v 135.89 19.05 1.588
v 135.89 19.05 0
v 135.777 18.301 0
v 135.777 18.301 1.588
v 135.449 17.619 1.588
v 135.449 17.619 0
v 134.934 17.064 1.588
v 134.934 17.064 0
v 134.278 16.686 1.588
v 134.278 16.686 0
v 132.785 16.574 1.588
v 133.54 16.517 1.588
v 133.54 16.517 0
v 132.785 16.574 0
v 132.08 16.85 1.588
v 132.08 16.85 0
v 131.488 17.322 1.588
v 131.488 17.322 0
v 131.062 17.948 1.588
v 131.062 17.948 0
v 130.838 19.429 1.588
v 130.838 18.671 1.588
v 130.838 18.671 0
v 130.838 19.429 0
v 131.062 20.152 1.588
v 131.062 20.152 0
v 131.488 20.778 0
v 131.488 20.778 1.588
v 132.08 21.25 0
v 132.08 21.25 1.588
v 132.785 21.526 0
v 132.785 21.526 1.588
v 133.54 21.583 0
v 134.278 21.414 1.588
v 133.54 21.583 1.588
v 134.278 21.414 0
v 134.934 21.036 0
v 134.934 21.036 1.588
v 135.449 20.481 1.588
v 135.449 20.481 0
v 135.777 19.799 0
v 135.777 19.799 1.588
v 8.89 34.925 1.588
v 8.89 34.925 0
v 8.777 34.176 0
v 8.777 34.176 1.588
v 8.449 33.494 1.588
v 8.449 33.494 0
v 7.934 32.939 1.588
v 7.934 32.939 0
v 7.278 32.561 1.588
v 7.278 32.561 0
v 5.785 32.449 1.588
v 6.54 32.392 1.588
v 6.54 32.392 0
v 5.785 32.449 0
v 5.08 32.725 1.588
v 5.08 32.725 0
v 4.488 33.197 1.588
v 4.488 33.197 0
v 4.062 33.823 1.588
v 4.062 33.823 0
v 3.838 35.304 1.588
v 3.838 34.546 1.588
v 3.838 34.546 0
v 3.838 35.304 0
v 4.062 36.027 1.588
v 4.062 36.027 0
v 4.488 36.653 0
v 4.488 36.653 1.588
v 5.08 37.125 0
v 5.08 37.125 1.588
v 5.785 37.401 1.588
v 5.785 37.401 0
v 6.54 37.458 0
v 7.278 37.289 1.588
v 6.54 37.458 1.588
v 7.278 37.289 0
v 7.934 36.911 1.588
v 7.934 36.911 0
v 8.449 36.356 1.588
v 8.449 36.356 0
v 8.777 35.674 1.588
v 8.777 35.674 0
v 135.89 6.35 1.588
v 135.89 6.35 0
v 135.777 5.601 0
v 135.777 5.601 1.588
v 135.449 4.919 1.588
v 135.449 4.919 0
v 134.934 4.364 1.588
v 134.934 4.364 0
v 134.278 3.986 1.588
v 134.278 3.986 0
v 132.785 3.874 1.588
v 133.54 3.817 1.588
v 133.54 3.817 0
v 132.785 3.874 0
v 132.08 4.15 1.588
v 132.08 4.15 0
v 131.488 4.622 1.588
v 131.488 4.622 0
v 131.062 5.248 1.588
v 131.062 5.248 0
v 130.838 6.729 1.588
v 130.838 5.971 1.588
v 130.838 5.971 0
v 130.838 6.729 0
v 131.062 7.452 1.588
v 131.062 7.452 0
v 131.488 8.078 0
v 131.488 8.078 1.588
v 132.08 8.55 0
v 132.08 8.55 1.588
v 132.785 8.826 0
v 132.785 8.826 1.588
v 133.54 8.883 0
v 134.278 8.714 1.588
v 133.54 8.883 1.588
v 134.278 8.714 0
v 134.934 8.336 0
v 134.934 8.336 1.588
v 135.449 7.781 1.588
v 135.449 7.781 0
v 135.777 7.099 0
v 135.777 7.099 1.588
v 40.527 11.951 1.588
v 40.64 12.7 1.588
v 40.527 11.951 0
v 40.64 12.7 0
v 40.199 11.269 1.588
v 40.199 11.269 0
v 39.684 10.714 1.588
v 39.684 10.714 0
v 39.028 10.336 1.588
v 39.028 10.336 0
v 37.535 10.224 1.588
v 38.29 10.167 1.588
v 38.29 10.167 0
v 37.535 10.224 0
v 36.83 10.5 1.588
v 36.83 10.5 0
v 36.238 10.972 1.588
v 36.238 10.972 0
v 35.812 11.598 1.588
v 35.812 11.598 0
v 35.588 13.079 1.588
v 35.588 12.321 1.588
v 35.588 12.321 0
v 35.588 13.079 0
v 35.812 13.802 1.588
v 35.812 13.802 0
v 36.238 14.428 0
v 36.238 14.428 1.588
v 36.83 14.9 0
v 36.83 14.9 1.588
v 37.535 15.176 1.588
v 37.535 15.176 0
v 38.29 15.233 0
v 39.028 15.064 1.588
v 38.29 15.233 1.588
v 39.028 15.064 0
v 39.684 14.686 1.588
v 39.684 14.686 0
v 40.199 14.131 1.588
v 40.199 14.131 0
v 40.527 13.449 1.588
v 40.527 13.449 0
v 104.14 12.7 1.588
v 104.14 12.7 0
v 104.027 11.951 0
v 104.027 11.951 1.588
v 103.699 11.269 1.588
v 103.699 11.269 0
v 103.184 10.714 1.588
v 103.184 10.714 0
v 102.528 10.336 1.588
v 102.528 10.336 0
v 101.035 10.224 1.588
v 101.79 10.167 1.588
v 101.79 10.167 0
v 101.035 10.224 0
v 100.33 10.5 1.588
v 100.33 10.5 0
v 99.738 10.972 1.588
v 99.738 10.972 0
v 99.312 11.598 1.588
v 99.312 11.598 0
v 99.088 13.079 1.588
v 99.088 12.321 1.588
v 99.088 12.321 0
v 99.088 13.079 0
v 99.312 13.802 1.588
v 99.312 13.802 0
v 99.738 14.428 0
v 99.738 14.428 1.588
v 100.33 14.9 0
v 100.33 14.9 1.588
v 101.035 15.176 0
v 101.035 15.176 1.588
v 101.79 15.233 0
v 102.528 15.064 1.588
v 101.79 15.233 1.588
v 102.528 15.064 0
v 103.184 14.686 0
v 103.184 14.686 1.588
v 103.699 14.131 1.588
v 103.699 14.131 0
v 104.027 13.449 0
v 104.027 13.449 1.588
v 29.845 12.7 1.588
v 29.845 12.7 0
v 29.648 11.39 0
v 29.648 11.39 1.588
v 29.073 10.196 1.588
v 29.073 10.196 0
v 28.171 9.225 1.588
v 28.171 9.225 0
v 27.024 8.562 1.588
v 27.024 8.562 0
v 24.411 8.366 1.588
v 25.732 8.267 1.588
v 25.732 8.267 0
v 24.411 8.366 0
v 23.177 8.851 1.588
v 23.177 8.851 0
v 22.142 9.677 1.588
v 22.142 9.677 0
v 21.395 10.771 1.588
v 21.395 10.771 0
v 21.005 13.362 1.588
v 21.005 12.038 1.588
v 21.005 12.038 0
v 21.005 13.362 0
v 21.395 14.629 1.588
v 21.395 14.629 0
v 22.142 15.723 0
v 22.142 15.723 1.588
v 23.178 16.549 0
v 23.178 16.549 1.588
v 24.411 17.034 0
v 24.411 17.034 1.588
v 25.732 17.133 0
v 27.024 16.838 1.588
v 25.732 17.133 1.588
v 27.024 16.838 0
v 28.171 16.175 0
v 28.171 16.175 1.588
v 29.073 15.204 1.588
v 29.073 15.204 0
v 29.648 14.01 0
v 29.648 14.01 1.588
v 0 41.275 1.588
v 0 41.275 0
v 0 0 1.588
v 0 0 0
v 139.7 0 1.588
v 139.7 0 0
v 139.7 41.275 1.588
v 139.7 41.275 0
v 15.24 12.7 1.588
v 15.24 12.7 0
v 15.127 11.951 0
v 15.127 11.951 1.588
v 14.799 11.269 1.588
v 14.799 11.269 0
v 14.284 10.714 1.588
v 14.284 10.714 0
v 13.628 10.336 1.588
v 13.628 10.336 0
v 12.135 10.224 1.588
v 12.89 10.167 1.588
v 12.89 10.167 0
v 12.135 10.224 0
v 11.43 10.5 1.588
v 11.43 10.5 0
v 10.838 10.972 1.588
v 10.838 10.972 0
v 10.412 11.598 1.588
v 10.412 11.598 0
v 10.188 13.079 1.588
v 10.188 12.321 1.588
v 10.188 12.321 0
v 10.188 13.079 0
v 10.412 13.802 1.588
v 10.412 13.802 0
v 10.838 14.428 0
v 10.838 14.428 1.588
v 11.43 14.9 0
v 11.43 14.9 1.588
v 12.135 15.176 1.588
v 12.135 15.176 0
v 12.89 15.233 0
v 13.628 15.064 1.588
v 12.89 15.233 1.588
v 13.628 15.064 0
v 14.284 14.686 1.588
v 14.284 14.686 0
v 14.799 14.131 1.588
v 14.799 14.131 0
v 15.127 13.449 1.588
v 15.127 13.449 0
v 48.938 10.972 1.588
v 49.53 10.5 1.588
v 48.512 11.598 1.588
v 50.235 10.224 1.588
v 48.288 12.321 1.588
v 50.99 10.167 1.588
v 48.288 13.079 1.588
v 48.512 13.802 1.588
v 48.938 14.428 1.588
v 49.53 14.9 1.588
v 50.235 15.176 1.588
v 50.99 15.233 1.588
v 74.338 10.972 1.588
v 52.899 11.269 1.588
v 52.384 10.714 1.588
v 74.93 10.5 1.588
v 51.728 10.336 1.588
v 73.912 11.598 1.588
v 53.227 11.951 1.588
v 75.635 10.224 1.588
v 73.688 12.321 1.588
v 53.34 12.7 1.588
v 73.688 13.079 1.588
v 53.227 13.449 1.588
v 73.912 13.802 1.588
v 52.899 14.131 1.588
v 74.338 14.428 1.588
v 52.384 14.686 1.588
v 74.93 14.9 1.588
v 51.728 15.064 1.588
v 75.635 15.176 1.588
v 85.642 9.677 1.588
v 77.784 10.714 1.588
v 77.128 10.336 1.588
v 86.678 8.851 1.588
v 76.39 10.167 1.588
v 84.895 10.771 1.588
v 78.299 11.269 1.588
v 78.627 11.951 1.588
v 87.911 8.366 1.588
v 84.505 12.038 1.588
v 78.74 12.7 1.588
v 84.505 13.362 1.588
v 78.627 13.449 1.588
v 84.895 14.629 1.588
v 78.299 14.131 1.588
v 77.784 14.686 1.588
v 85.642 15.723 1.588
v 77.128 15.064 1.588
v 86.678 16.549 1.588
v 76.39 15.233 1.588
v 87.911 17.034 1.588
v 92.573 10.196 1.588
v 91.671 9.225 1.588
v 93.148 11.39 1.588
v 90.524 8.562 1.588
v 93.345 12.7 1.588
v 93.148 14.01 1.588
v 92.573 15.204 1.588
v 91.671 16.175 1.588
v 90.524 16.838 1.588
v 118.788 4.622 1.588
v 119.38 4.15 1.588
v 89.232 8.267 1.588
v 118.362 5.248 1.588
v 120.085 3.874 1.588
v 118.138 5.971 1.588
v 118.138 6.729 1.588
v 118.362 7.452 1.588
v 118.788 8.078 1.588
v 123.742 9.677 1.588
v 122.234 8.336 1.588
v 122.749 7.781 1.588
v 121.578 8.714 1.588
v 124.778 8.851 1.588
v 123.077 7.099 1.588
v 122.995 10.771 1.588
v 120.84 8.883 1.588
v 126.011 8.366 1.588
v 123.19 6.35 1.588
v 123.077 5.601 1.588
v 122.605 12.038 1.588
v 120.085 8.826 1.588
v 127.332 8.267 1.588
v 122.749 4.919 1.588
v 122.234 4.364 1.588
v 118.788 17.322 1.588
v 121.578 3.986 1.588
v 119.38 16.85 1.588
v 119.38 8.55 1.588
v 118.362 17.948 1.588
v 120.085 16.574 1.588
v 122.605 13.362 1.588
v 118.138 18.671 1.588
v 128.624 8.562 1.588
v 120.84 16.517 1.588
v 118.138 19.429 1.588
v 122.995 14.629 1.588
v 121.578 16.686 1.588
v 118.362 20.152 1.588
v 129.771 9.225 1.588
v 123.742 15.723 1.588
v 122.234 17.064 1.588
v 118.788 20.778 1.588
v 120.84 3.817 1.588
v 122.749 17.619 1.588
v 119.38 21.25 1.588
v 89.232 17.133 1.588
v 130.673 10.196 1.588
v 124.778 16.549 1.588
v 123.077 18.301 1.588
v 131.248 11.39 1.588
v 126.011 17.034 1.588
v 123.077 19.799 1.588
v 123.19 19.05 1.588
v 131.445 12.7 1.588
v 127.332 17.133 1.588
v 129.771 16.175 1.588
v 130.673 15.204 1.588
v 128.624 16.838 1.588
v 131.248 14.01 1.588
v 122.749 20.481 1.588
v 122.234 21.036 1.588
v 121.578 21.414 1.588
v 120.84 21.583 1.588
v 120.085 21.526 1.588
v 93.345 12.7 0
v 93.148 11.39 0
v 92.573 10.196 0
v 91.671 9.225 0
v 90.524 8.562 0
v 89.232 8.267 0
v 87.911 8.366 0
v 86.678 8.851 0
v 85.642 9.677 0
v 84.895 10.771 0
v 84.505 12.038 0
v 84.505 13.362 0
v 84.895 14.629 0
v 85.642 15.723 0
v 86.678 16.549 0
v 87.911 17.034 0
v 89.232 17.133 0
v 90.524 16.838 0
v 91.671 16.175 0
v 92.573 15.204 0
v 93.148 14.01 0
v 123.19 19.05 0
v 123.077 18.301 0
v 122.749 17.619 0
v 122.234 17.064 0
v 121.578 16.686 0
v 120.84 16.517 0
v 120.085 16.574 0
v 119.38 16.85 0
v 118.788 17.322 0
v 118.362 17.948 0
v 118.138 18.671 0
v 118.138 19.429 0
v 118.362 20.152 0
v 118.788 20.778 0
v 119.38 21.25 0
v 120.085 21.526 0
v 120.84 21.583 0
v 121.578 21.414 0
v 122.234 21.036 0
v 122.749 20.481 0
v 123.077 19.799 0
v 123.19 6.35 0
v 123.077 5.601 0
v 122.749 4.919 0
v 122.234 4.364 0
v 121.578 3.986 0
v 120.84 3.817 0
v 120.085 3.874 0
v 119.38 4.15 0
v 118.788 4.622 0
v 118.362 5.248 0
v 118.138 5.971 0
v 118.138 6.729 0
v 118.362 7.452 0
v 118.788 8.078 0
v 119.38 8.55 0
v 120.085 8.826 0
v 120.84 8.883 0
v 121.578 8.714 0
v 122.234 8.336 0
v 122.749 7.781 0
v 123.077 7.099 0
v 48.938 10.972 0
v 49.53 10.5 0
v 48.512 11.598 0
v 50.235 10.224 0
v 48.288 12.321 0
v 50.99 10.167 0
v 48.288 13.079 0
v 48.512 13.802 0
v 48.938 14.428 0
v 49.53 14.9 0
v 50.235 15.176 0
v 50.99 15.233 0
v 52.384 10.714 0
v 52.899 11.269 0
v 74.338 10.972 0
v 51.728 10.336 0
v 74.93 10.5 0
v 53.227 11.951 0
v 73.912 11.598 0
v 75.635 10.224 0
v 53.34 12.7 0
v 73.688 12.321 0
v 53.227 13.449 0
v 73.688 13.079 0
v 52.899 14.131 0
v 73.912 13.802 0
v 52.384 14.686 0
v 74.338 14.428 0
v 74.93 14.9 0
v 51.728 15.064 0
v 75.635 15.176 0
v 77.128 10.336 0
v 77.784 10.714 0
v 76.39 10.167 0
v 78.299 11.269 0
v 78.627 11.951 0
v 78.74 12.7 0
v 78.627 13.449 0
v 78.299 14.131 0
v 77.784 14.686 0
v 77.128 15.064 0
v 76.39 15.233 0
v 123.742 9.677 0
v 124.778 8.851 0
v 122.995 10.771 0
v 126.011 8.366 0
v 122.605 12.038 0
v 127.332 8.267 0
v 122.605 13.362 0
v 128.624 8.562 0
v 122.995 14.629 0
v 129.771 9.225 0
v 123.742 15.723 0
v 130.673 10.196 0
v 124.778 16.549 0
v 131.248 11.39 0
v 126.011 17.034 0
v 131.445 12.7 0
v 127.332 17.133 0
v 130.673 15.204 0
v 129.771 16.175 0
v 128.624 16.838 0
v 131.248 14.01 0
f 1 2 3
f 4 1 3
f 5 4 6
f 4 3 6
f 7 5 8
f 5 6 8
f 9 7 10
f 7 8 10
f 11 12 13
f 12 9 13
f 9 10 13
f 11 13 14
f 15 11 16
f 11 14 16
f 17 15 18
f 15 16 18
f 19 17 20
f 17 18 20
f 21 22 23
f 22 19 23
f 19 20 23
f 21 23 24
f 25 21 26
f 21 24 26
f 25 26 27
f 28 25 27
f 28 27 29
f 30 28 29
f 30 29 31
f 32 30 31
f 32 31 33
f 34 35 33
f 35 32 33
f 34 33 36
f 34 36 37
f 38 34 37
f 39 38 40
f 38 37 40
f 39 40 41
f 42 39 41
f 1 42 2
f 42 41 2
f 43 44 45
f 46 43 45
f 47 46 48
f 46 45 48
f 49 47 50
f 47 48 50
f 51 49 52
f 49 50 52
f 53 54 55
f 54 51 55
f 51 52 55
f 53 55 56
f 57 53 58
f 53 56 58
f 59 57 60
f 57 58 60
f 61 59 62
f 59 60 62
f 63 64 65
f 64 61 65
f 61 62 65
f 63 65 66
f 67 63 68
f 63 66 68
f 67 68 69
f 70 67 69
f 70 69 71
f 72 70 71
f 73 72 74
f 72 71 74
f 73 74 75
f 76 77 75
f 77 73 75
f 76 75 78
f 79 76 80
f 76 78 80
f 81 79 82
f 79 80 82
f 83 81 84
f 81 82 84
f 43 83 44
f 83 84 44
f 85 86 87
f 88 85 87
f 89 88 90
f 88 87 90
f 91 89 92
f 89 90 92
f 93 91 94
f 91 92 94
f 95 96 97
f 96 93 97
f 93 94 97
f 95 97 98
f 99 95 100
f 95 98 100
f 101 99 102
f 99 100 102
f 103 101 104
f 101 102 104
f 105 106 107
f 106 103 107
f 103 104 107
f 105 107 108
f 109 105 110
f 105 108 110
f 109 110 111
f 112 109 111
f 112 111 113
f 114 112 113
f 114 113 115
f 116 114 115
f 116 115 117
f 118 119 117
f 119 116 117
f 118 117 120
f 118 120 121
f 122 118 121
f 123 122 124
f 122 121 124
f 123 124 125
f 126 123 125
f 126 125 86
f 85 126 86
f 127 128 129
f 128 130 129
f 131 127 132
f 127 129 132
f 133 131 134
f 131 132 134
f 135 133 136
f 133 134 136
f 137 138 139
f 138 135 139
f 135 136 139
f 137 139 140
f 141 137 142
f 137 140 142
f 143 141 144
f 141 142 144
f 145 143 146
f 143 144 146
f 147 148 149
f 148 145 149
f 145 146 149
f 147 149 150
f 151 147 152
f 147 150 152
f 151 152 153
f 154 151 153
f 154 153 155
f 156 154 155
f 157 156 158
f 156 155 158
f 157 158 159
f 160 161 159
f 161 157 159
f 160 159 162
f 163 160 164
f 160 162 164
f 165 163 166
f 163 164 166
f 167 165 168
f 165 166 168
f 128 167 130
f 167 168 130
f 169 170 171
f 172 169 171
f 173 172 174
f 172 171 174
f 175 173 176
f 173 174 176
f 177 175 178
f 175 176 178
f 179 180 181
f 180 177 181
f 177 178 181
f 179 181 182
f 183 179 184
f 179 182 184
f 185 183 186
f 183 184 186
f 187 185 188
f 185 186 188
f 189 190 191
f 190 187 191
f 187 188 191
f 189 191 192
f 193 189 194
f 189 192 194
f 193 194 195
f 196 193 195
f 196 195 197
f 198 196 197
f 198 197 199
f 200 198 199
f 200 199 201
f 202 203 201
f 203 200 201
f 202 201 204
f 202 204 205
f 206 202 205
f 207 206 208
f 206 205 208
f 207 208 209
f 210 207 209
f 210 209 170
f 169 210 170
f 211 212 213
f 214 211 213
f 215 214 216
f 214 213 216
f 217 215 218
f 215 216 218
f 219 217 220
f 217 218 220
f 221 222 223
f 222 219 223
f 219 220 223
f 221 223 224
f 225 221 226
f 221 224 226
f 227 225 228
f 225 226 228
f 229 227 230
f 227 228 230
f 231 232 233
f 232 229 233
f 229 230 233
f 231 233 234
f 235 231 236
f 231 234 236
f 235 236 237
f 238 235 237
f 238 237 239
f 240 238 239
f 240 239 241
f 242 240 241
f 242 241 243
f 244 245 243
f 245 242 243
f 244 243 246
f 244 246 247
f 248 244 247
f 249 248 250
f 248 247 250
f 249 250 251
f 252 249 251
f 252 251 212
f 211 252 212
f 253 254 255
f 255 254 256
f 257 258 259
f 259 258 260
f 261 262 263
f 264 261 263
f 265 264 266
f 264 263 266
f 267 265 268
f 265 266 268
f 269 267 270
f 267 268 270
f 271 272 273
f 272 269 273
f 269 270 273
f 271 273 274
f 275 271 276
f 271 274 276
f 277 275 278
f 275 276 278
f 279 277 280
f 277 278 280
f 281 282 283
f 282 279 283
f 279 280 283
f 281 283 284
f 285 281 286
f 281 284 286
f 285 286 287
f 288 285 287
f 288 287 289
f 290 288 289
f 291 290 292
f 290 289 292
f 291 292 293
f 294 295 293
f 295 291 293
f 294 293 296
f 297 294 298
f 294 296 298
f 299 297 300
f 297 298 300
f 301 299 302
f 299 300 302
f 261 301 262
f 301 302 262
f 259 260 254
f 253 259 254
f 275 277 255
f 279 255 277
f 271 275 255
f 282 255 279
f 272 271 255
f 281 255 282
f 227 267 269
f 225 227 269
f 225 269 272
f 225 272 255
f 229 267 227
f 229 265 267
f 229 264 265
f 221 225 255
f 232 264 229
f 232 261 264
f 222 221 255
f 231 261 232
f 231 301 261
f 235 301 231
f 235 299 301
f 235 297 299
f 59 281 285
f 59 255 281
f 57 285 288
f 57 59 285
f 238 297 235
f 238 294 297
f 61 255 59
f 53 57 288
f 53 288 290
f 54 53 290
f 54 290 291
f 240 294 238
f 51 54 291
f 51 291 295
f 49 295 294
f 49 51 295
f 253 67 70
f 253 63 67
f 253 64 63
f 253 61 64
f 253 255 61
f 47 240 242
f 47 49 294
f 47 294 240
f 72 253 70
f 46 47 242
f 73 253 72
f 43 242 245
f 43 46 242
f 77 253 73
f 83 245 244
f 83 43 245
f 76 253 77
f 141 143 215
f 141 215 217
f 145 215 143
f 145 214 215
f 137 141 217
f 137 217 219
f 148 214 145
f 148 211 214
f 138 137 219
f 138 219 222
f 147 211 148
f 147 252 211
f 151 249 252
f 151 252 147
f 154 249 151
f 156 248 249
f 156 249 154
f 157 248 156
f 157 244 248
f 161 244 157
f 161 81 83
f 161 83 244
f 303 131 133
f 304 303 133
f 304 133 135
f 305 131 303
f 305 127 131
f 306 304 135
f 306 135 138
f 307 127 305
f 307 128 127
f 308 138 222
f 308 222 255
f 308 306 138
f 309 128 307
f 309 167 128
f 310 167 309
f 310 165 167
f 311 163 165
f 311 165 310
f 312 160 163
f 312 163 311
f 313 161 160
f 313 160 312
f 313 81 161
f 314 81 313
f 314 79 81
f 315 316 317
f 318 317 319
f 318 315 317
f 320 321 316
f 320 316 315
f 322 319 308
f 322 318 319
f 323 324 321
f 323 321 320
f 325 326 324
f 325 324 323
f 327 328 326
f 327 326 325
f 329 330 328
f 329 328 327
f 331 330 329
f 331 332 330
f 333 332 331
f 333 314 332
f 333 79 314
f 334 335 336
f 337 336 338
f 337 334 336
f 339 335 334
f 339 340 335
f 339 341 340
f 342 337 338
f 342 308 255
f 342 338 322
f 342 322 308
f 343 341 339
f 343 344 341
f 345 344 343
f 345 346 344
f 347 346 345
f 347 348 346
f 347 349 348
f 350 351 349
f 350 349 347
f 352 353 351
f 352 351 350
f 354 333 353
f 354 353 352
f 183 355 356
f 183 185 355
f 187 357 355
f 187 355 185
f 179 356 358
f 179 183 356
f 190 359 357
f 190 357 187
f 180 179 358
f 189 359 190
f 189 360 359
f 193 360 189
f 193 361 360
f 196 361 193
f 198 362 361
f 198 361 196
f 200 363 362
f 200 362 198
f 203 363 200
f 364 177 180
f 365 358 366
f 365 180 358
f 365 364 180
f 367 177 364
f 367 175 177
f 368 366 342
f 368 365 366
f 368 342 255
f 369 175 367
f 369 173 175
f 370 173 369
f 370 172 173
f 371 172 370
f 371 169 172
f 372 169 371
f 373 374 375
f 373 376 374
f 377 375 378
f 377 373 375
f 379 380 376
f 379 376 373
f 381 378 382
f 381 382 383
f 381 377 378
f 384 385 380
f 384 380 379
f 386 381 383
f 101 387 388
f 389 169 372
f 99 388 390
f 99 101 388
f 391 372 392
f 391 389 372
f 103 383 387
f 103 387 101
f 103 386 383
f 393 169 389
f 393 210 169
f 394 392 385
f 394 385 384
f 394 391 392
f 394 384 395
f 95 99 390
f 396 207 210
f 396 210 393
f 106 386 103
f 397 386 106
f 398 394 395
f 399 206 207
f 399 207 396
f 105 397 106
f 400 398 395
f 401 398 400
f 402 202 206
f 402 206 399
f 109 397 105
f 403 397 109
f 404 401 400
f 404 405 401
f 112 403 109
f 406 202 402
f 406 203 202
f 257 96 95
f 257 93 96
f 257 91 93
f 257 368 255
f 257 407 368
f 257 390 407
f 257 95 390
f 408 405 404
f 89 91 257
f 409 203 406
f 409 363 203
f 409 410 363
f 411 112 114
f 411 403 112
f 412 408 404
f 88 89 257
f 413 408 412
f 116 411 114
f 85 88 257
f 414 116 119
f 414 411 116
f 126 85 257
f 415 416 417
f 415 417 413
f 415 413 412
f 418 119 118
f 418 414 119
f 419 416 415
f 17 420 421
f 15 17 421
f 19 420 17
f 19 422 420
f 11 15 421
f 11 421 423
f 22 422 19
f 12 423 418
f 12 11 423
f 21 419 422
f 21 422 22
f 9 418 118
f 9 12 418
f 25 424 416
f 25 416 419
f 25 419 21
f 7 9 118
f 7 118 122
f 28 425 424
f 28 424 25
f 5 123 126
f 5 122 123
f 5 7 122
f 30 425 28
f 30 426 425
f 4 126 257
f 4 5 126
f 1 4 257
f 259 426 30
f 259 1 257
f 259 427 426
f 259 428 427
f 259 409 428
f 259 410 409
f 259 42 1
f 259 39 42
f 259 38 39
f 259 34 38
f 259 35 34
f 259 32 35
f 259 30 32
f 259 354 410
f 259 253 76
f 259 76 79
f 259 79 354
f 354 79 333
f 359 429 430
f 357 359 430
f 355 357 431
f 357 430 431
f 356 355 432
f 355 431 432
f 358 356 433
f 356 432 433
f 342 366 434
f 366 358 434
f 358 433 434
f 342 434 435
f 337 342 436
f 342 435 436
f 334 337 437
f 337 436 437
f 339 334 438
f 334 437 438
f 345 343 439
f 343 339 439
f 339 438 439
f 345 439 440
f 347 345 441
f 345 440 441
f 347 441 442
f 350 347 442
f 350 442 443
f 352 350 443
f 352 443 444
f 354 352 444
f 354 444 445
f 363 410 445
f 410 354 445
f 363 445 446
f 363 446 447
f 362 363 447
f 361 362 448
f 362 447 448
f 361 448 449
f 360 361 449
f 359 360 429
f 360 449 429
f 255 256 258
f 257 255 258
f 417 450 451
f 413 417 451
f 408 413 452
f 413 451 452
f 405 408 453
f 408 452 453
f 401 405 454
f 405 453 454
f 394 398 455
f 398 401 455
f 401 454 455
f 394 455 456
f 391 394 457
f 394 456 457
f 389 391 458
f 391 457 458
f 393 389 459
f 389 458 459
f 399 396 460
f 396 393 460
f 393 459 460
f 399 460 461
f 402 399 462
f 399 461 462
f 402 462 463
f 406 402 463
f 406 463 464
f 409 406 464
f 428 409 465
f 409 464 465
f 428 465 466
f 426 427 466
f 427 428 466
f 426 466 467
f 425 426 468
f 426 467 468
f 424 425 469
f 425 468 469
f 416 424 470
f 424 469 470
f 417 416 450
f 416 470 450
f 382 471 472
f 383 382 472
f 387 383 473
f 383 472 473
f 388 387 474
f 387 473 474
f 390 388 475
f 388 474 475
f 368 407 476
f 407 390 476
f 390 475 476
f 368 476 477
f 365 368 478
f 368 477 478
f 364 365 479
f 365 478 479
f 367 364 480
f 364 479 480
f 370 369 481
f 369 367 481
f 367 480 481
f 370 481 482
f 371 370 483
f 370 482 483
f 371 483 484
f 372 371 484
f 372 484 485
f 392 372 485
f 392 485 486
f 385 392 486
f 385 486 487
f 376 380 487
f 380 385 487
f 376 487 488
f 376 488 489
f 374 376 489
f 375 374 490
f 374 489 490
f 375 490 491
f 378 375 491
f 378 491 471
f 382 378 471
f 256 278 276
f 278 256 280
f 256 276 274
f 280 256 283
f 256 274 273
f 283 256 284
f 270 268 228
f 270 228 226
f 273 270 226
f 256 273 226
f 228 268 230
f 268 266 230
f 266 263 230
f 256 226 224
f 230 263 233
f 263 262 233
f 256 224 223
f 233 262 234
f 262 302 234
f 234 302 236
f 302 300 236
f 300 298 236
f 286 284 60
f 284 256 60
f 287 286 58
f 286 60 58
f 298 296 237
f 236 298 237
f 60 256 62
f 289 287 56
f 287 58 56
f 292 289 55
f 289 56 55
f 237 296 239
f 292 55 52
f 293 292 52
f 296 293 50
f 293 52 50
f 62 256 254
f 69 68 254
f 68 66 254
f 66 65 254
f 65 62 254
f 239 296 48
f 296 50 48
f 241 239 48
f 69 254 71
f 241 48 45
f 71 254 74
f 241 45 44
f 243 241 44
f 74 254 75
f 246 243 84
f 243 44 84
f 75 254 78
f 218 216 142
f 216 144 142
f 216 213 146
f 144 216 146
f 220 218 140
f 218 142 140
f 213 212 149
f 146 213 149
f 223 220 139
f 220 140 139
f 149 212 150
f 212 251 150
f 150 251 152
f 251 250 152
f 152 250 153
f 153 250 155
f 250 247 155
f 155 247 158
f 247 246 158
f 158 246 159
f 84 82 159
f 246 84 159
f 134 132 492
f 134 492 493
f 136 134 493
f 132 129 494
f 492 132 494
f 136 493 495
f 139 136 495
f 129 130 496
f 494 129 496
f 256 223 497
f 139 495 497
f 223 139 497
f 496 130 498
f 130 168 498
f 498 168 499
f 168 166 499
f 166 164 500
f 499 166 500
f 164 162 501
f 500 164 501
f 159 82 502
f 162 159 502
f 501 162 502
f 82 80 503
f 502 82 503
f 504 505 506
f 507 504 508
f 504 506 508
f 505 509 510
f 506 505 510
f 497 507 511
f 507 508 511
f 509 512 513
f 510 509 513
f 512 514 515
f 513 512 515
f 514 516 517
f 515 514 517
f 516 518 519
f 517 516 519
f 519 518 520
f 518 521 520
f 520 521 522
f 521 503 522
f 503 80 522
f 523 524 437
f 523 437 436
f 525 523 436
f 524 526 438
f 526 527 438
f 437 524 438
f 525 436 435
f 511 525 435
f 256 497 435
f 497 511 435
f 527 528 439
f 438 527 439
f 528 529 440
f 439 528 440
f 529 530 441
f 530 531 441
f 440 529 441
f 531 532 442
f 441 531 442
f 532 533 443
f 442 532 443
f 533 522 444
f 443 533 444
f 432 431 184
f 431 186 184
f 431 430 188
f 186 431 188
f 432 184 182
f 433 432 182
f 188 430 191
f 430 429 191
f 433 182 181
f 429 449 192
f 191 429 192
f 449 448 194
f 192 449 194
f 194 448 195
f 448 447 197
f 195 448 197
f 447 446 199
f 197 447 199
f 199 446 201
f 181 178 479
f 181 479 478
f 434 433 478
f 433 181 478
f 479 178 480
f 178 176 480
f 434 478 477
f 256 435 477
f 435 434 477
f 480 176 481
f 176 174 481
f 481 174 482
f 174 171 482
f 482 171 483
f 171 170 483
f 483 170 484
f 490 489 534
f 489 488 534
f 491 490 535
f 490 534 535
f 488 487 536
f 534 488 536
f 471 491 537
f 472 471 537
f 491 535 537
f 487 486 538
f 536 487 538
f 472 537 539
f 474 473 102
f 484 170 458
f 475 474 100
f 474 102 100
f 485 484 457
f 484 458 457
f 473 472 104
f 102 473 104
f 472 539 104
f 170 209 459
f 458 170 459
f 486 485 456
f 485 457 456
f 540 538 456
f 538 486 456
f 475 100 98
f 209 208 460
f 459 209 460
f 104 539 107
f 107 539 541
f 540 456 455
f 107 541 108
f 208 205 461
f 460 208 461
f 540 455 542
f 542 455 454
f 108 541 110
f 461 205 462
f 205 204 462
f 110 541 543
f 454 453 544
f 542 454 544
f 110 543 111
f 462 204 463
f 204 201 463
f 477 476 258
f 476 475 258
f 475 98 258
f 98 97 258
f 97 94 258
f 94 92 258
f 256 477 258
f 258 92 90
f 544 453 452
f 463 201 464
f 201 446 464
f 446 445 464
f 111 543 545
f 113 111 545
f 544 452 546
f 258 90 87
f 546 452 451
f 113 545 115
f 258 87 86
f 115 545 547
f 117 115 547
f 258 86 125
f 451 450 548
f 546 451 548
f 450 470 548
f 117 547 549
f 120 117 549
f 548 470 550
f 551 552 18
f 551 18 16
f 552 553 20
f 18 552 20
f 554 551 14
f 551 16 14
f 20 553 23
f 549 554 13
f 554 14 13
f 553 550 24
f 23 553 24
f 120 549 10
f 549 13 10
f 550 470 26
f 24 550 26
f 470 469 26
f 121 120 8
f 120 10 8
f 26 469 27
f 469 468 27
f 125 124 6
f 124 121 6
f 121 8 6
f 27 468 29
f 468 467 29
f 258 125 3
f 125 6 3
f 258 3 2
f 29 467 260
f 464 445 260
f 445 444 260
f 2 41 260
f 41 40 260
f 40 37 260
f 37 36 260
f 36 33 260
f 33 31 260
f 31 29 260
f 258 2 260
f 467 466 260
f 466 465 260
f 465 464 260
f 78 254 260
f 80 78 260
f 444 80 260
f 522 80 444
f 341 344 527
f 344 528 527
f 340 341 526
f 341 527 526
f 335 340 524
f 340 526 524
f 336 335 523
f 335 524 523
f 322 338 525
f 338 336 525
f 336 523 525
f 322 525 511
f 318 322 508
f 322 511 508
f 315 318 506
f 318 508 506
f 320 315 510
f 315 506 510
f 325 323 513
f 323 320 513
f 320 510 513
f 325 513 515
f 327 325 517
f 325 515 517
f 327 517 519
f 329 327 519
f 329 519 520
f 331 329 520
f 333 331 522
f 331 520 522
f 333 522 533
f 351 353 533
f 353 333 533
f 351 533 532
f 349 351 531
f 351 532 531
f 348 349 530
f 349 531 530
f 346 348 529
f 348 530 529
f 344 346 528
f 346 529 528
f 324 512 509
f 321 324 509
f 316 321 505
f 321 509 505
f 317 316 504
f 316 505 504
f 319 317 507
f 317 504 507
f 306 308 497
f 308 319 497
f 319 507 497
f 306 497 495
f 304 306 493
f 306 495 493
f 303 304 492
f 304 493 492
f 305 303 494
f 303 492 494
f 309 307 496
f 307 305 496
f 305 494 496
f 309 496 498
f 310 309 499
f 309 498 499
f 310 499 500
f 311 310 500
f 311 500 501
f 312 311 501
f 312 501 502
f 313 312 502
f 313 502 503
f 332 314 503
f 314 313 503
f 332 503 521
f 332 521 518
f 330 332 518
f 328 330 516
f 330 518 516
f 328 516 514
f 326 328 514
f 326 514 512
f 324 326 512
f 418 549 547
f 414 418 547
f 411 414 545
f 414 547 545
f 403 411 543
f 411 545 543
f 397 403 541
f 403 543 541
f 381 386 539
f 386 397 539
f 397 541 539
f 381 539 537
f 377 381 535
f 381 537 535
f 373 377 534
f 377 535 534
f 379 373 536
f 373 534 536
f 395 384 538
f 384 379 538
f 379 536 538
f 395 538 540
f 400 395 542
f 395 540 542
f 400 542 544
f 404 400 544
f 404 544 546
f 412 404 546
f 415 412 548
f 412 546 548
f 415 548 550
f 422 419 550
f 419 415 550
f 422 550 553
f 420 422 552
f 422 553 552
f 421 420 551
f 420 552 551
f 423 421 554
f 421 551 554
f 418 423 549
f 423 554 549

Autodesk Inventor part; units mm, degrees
ref_plane "YZ Plane" through (0, 0, 0) normal (1, 0, 0) x (0, 1, 0)
ref_plane "XZ Plane" through (0, 0, 0) normal (0, 1, 0) x (-1, 0, 0)
ref_plane "XY Plane" through (0, 0, 0) normal (0, 0, 1) x (1, 0, 0)
sketch "Sketch1" plane through (0, 0, 0) normal (0, 0, 1) x (1, 0, 0)
  line L0 (0, 0) -> (139.7, 0)
  line L1 (139.7, 0) -> (139.7, 41.275)
  line L2 (139.7, 41.275) -> (0, 41.275)
  line L3 (0, 41.275) -> (0, 0)
  circle A0 centre (12.7, 12.7) radius 2.54
  circle A1 centre (25.4, 12.7) radius 4.445
  circle A2 centre (38.1, 12.7) radius 2.54
  circle A3 centre (50.8, 12.7) radius 2.54
  circle A4 centre (76.2, 12.7) radius 2.54
  circle A5 centre (88.9, 12.7) radius 4.445
  circle A6 centre (101.6, 12.7) radius 2.54
  circle A7 centre (127, 12.7) radius 4.445
  circle A8 centre (133.35, 19.05) radius 2.54
  circle A9 centre (133.35, 6.35) radius 2.54
  circle A10 centre (120.65, 6.35) radius 2.54
  circle A11 centre (120.65, 19.05) radius 2.54
  circle A12 centre (6.35, 34.925) radius 2.54
  dimension "d0" = 139.7
  dimension "d1" = 41.275
  dimension "d6" = 5.08
  dimension "d12" = 8.89
  dimension "d13" = 5.08
  dimension "d14" = 5.08
  dimension "d15" = 5.08
  dimension "d19" = 8.89
  dimension "d20" = 5.08
  dimension "d21" = 8.89
  dimension "d24" = 5.08
  dimension "d28" = 5.08
  dimension "d29" = 5.08
  dimension "d30" = 5.08
  dimension "d34" = 5.08
extrude "Extrusion1" add sketch "Sketch1" along normal blind 1.5875
properties part number "flatPoly1ForCNC"
